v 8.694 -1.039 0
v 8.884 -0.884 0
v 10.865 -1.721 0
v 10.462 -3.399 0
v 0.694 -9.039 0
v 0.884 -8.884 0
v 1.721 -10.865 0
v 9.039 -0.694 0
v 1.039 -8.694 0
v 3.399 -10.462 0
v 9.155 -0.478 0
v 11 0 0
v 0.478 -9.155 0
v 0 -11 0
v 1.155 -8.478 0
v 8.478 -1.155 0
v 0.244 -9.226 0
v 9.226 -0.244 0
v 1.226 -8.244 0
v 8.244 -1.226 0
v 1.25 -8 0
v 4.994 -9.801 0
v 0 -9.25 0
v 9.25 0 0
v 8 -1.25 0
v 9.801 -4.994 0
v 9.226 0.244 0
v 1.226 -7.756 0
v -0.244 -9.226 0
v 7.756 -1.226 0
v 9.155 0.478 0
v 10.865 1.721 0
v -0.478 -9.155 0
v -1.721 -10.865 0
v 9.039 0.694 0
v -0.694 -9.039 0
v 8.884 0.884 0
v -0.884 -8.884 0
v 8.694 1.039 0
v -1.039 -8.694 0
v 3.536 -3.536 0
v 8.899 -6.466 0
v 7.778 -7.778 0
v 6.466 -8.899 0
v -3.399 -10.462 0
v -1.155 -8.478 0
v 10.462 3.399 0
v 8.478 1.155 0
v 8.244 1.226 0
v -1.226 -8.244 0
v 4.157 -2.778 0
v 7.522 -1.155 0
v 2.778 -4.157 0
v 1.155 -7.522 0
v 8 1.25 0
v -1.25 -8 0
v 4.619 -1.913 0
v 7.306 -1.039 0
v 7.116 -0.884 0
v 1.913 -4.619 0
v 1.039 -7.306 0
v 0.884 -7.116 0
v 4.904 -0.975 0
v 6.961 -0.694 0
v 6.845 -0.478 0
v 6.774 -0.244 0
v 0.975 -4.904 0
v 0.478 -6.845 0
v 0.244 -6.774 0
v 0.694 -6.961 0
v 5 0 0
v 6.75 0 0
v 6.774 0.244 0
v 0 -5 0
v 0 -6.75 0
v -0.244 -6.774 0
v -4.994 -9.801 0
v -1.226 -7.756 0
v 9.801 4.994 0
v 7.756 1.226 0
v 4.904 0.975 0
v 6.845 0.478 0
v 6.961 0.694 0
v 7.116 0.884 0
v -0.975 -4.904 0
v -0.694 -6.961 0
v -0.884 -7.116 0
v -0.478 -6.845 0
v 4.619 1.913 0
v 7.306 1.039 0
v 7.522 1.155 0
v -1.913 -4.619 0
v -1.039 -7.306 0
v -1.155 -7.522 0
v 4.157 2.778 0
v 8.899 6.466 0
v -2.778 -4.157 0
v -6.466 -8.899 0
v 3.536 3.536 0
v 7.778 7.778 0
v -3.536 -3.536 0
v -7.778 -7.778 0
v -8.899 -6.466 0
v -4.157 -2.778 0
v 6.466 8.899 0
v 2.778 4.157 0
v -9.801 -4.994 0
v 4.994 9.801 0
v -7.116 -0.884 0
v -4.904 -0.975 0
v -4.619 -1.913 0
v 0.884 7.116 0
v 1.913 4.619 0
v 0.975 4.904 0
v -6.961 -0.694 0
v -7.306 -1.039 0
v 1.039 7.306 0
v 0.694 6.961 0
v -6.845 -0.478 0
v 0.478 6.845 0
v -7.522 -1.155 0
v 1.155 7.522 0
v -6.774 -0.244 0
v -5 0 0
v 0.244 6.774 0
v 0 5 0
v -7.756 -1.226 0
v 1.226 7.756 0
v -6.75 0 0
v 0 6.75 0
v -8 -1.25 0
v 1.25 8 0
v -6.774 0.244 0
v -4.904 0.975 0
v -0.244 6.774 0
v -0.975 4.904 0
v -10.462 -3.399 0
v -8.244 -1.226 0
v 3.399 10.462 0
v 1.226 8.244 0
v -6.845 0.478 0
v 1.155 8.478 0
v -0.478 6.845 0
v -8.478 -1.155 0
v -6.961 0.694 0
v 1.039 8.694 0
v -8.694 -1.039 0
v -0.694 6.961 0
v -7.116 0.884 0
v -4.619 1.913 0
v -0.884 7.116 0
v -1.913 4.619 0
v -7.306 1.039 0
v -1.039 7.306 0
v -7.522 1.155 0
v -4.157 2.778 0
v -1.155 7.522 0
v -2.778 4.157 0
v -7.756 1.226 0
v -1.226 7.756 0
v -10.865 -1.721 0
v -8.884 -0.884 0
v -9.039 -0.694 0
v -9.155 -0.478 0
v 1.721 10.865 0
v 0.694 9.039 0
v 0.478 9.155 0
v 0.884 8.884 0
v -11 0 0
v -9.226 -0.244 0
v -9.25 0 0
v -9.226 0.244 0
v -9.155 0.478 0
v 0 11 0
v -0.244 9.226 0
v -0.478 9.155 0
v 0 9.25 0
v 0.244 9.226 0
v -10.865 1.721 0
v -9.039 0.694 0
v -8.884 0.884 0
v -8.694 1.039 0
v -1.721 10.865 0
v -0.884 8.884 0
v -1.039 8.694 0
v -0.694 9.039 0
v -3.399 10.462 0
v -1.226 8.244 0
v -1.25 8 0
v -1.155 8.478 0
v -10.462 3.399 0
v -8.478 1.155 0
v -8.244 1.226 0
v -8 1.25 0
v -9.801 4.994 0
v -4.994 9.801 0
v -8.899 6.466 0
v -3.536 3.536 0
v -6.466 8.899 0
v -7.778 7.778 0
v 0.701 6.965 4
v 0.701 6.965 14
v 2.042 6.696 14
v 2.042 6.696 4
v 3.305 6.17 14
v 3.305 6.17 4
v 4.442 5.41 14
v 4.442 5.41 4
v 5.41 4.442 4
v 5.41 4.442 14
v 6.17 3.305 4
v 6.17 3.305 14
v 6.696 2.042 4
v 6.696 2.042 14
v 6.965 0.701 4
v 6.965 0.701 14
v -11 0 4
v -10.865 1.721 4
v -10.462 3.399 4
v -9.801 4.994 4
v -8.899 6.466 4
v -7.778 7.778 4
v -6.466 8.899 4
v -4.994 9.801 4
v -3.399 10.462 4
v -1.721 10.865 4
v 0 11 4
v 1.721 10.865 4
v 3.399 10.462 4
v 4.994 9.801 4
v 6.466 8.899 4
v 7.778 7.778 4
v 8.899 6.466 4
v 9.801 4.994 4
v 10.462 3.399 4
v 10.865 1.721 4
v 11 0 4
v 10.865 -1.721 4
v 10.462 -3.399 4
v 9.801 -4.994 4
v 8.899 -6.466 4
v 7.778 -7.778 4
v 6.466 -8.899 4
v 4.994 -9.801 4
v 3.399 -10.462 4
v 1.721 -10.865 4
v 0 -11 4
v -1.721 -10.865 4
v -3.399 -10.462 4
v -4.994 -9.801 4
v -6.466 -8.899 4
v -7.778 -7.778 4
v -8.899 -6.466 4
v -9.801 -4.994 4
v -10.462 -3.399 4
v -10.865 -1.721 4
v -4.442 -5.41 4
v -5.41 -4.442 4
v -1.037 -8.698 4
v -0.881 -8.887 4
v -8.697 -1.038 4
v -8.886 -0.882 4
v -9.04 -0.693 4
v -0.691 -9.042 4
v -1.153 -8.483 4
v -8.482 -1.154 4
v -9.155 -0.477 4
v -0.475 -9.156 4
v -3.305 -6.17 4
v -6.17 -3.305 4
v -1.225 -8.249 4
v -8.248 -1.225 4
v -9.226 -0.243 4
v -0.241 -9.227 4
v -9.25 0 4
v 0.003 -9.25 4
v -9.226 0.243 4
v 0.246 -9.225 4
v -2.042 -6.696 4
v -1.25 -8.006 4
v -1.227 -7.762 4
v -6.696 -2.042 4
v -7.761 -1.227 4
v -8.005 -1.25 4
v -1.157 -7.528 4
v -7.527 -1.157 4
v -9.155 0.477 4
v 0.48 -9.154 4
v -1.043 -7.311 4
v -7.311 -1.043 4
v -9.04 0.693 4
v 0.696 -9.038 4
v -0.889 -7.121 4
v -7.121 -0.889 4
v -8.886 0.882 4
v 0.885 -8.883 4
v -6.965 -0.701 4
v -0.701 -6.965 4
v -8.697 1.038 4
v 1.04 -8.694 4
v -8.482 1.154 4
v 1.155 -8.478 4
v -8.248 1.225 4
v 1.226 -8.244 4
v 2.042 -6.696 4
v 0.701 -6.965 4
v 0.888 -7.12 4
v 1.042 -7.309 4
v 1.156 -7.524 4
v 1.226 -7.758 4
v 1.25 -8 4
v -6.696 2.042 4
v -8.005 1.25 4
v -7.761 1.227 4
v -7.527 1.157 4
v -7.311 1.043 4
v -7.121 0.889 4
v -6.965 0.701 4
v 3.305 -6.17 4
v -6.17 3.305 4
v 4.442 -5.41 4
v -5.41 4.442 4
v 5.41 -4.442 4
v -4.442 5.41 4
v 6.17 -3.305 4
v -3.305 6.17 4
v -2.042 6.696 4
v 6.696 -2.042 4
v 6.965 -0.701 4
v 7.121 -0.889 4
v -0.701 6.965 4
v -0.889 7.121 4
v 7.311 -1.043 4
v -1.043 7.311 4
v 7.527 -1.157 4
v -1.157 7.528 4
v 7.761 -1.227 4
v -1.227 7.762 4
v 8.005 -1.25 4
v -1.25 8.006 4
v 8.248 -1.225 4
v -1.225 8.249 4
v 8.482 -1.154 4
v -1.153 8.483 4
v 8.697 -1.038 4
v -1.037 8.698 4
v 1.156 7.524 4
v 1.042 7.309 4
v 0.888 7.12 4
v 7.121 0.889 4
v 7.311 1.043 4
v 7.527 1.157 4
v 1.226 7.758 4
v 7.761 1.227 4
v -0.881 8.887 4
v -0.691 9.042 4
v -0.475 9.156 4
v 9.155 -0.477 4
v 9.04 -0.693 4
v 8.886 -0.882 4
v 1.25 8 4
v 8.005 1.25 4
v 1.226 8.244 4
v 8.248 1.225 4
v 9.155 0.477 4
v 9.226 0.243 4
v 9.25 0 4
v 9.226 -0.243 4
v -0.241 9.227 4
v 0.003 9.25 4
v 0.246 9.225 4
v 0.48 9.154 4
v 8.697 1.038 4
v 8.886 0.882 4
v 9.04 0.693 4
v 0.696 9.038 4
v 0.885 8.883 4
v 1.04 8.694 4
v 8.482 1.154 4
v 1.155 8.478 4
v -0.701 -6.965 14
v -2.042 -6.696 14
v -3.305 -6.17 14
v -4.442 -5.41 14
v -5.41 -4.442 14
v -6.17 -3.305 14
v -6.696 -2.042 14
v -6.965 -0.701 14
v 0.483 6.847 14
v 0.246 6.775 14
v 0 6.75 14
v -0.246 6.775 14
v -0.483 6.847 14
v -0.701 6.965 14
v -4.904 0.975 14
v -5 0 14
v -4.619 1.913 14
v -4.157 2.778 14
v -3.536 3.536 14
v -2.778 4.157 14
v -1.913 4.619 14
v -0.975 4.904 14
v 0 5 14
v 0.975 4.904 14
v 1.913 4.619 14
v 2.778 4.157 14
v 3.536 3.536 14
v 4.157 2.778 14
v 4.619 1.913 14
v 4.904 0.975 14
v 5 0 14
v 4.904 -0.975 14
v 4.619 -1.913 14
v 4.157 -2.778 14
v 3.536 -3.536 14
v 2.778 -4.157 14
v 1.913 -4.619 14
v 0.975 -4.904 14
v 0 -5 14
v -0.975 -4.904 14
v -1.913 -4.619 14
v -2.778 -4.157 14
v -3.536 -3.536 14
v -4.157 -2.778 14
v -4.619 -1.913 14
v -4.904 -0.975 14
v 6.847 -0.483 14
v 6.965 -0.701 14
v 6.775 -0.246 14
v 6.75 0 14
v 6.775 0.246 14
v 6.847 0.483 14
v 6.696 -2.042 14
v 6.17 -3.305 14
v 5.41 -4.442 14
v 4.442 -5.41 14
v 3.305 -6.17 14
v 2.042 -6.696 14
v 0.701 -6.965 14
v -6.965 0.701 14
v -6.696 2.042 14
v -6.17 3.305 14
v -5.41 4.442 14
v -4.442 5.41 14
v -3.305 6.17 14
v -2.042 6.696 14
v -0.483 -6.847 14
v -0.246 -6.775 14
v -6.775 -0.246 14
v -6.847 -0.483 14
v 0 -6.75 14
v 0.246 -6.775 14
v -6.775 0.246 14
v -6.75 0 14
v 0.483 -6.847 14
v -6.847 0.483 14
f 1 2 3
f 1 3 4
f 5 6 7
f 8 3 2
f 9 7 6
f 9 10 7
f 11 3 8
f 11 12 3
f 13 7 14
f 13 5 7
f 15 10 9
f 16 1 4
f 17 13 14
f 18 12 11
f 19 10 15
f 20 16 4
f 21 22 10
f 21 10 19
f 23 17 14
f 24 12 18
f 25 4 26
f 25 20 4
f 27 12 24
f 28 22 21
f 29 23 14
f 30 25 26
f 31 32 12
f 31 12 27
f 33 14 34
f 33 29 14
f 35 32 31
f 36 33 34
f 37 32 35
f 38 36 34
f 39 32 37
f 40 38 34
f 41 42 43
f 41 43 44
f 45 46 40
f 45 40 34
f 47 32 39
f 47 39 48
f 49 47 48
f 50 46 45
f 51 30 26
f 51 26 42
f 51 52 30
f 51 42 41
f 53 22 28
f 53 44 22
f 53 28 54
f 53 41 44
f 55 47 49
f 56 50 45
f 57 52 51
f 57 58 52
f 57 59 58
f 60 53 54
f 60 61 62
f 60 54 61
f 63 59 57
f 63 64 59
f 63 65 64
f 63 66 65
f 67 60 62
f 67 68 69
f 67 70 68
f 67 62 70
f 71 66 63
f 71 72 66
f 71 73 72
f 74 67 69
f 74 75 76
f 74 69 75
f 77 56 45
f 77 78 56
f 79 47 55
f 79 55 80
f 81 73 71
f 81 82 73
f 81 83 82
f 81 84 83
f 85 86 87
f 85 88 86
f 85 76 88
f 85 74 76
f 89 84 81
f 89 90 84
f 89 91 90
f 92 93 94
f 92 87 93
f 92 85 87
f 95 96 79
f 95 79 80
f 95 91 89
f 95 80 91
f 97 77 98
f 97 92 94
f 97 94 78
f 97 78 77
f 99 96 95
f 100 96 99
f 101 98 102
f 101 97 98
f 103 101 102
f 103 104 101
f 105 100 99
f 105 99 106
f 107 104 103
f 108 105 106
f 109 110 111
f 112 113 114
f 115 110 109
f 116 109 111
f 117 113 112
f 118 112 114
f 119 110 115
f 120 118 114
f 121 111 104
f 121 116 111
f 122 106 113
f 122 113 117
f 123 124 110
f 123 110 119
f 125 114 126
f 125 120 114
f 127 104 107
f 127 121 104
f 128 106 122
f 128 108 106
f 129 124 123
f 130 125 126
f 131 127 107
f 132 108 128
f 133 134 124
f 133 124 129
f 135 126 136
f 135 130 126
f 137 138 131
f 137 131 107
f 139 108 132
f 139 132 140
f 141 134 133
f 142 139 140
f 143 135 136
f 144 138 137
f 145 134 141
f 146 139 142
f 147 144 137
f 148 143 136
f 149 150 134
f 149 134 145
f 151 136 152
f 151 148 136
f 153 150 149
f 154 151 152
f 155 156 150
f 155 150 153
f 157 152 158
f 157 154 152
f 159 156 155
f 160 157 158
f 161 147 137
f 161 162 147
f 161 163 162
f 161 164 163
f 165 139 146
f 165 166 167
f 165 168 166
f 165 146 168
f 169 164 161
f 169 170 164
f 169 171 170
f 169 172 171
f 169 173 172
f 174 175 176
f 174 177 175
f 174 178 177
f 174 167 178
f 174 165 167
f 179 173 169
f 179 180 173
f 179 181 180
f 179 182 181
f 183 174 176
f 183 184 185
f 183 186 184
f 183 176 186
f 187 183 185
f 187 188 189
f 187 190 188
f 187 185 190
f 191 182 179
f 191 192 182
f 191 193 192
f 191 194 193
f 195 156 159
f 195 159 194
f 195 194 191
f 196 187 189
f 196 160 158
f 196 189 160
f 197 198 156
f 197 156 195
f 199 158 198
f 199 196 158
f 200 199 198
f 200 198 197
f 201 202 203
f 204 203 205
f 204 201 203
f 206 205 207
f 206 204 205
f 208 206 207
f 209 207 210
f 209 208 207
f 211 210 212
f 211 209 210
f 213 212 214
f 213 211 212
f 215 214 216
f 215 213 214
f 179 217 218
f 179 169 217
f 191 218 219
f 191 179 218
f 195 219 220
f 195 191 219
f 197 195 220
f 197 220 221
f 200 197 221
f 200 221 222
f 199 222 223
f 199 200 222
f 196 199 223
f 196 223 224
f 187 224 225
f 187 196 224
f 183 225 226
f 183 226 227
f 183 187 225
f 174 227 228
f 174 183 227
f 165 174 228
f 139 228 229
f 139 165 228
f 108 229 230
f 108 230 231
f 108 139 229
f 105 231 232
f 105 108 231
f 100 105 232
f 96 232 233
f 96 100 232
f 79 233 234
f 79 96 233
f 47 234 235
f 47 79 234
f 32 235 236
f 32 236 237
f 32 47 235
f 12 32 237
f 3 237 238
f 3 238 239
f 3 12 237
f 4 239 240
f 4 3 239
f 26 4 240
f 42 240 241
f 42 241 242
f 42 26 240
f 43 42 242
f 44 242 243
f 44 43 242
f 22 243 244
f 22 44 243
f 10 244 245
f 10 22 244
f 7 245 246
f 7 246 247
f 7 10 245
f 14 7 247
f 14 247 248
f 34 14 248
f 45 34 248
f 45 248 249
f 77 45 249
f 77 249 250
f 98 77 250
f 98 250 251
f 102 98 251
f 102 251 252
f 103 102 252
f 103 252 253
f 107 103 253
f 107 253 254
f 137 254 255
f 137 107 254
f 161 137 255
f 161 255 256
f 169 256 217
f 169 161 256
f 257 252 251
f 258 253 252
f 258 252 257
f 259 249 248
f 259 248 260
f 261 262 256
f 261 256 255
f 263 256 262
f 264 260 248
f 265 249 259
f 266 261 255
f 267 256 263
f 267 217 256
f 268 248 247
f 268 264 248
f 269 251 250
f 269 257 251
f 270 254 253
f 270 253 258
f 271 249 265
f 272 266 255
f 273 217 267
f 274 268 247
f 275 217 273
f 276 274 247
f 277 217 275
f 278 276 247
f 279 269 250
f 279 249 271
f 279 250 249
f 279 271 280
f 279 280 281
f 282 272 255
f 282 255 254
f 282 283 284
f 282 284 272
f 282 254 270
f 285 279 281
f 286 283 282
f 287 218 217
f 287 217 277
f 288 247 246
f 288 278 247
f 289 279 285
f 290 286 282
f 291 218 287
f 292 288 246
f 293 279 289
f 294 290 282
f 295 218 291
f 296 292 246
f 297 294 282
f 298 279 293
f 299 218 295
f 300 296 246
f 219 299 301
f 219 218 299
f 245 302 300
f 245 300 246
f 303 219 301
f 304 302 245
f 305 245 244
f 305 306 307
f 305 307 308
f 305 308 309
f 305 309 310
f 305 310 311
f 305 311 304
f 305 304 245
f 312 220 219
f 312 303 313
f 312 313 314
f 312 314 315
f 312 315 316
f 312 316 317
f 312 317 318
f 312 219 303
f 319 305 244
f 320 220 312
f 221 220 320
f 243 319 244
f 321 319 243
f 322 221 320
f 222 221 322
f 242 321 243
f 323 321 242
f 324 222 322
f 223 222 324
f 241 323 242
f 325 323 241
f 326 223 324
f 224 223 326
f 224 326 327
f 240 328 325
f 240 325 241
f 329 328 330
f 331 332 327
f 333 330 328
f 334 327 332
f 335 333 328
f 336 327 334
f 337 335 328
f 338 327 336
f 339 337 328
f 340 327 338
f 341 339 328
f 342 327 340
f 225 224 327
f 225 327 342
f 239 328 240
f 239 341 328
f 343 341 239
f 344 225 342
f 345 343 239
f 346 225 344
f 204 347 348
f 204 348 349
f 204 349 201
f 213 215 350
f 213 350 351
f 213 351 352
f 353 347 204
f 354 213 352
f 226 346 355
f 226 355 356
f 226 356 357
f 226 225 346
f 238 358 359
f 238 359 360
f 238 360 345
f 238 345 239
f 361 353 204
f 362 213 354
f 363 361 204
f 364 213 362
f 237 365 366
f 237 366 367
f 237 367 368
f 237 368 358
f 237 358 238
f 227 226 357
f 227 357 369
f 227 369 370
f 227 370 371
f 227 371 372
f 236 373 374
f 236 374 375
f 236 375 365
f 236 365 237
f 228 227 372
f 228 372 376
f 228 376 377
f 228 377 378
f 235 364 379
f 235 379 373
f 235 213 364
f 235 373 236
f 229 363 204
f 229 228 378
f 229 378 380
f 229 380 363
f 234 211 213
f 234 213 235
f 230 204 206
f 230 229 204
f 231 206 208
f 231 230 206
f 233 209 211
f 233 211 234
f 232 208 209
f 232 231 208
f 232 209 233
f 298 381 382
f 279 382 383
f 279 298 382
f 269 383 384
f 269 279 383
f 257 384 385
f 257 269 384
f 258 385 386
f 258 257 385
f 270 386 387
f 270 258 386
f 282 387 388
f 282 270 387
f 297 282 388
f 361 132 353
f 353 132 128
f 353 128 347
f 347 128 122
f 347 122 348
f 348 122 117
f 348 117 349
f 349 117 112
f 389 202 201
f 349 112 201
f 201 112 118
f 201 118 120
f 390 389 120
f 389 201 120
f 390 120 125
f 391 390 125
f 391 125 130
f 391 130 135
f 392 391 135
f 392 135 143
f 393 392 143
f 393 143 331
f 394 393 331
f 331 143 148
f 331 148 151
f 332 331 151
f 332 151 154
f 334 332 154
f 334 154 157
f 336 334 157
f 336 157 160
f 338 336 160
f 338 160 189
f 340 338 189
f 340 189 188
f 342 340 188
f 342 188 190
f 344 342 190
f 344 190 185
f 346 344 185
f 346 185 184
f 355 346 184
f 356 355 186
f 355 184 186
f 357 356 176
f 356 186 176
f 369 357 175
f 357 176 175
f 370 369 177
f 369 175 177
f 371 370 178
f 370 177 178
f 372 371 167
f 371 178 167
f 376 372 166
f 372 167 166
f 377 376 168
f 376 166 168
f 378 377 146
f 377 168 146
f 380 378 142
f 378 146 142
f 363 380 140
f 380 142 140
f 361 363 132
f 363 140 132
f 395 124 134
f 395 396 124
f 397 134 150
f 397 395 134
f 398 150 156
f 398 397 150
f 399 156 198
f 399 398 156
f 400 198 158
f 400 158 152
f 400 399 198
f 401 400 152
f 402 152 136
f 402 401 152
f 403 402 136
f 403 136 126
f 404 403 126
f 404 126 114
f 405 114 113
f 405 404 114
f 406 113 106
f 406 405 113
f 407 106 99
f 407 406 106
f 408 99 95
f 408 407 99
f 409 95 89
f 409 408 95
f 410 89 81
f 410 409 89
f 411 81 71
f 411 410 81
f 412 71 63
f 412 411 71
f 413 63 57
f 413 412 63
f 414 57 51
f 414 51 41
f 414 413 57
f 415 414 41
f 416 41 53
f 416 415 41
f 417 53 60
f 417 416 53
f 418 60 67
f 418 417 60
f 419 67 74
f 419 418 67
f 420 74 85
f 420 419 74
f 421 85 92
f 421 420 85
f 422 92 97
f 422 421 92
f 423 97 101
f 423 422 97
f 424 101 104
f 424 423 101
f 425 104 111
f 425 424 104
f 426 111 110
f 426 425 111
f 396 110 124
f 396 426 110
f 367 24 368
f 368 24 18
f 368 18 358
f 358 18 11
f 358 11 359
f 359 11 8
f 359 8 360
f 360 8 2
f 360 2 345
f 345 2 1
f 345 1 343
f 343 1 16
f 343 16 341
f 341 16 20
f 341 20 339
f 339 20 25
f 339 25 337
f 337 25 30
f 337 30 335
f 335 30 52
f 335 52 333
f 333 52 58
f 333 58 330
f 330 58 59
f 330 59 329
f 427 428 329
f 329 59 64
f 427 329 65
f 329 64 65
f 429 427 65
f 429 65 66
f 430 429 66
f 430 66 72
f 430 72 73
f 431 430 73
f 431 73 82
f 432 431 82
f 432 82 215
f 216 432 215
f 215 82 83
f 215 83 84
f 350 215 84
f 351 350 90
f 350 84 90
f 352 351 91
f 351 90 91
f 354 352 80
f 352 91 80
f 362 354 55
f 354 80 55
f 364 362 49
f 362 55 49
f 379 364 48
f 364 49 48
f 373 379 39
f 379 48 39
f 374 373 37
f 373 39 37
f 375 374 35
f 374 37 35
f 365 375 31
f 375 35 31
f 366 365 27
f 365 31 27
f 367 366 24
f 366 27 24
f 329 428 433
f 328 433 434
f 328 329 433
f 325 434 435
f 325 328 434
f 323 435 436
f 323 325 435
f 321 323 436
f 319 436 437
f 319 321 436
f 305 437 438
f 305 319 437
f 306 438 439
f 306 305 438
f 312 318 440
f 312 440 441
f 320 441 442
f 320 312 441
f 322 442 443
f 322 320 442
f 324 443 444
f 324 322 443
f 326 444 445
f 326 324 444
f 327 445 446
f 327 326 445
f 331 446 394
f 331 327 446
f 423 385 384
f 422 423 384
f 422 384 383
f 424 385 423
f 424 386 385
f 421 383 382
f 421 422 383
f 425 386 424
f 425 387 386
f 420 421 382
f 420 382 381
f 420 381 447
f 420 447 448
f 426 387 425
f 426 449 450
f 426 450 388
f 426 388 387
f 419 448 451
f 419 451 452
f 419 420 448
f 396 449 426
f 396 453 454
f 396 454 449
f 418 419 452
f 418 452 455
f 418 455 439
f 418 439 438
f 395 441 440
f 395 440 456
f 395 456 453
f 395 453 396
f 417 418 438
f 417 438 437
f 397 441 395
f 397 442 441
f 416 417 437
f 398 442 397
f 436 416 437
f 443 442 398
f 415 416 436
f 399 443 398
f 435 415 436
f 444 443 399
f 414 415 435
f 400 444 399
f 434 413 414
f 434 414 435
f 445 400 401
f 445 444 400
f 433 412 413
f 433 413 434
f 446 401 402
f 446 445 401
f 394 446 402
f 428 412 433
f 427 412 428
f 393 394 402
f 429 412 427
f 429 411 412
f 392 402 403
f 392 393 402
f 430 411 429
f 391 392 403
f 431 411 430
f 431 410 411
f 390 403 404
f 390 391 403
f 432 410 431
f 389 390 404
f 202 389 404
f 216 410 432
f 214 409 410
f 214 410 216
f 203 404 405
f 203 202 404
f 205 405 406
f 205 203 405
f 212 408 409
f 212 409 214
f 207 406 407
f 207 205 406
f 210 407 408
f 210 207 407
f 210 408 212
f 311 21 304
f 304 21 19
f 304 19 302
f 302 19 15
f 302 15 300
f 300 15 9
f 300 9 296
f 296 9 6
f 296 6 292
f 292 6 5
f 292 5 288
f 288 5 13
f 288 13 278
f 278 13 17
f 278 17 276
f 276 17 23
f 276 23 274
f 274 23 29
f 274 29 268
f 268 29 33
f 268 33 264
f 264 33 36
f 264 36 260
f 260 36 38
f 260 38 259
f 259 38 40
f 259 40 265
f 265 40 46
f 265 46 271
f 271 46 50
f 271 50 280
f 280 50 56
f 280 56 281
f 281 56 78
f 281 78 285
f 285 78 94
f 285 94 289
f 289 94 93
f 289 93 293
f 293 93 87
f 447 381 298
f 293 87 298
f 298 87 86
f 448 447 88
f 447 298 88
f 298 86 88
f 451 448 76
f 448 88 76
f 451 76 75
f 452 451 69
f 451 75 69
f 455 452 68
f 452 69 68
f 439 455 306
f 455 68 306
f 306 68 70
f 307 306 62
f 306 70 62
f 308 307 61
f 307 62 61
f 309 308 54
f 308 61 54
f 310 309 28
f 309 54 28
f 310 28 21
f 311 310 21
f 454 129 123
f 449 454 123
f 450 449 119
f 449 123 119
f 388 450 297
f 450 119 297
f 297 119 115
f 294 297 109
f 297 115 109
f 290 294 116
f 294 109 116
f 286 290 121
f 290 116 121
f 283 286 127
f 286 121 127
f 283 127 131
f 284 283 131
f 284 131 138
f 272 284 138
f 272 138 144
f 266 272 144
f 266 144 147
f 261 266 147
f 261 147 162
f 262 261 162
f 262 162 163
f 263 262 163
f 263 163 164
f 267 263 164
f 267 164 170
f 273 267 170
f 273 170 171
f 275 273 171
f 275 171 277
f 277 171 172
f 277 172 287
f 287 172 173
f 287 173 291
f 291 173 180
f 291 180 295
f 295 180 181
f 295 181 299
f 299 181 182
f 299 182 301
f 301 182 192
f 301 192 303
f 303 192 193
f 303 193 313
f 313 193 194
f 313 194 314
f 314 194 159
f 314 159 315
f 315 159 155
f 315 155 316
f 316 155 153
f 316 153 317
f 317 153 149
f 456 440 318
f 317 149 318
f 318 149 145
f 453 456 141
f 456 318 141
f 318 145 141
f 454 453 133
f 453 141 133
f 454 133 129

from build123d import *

# Parameters (mm, degrees)
F2_R     = 1.25
F3_DEPTH = 14


with BuildPart() as f1:
    # F0 (on Front) → F1 (revolve)
    with BuildSketch(Plane.XZ):
        Polygon((-5, 0), (-5, 14), (-7, 14), (-7, 4), (-11, 4), (-11, 0), align=None)
    revolve(axis=Axis((0, 0, -1.594857), (0, 0, -1)))

    # F2 (on face) → F3 (cut)
    with BuildSketch(Plane(origin=(0, 0, 0), x_dir=(1, 0, 0), z_dir=(0, 0, -1))):
        with Locations((0, 8)):
            Circle(F2_R)
        with Locations((-8, 0)):
            Circle(F2_R)
        with Locations((8, 0)):
            Circle(F2_R)
        with Locations((0, -8)):
            Circle(F2_R)
    extrude(amount=-F3_DEPTH, mode=Mode.SUBTRACT)


solid = f1.part
